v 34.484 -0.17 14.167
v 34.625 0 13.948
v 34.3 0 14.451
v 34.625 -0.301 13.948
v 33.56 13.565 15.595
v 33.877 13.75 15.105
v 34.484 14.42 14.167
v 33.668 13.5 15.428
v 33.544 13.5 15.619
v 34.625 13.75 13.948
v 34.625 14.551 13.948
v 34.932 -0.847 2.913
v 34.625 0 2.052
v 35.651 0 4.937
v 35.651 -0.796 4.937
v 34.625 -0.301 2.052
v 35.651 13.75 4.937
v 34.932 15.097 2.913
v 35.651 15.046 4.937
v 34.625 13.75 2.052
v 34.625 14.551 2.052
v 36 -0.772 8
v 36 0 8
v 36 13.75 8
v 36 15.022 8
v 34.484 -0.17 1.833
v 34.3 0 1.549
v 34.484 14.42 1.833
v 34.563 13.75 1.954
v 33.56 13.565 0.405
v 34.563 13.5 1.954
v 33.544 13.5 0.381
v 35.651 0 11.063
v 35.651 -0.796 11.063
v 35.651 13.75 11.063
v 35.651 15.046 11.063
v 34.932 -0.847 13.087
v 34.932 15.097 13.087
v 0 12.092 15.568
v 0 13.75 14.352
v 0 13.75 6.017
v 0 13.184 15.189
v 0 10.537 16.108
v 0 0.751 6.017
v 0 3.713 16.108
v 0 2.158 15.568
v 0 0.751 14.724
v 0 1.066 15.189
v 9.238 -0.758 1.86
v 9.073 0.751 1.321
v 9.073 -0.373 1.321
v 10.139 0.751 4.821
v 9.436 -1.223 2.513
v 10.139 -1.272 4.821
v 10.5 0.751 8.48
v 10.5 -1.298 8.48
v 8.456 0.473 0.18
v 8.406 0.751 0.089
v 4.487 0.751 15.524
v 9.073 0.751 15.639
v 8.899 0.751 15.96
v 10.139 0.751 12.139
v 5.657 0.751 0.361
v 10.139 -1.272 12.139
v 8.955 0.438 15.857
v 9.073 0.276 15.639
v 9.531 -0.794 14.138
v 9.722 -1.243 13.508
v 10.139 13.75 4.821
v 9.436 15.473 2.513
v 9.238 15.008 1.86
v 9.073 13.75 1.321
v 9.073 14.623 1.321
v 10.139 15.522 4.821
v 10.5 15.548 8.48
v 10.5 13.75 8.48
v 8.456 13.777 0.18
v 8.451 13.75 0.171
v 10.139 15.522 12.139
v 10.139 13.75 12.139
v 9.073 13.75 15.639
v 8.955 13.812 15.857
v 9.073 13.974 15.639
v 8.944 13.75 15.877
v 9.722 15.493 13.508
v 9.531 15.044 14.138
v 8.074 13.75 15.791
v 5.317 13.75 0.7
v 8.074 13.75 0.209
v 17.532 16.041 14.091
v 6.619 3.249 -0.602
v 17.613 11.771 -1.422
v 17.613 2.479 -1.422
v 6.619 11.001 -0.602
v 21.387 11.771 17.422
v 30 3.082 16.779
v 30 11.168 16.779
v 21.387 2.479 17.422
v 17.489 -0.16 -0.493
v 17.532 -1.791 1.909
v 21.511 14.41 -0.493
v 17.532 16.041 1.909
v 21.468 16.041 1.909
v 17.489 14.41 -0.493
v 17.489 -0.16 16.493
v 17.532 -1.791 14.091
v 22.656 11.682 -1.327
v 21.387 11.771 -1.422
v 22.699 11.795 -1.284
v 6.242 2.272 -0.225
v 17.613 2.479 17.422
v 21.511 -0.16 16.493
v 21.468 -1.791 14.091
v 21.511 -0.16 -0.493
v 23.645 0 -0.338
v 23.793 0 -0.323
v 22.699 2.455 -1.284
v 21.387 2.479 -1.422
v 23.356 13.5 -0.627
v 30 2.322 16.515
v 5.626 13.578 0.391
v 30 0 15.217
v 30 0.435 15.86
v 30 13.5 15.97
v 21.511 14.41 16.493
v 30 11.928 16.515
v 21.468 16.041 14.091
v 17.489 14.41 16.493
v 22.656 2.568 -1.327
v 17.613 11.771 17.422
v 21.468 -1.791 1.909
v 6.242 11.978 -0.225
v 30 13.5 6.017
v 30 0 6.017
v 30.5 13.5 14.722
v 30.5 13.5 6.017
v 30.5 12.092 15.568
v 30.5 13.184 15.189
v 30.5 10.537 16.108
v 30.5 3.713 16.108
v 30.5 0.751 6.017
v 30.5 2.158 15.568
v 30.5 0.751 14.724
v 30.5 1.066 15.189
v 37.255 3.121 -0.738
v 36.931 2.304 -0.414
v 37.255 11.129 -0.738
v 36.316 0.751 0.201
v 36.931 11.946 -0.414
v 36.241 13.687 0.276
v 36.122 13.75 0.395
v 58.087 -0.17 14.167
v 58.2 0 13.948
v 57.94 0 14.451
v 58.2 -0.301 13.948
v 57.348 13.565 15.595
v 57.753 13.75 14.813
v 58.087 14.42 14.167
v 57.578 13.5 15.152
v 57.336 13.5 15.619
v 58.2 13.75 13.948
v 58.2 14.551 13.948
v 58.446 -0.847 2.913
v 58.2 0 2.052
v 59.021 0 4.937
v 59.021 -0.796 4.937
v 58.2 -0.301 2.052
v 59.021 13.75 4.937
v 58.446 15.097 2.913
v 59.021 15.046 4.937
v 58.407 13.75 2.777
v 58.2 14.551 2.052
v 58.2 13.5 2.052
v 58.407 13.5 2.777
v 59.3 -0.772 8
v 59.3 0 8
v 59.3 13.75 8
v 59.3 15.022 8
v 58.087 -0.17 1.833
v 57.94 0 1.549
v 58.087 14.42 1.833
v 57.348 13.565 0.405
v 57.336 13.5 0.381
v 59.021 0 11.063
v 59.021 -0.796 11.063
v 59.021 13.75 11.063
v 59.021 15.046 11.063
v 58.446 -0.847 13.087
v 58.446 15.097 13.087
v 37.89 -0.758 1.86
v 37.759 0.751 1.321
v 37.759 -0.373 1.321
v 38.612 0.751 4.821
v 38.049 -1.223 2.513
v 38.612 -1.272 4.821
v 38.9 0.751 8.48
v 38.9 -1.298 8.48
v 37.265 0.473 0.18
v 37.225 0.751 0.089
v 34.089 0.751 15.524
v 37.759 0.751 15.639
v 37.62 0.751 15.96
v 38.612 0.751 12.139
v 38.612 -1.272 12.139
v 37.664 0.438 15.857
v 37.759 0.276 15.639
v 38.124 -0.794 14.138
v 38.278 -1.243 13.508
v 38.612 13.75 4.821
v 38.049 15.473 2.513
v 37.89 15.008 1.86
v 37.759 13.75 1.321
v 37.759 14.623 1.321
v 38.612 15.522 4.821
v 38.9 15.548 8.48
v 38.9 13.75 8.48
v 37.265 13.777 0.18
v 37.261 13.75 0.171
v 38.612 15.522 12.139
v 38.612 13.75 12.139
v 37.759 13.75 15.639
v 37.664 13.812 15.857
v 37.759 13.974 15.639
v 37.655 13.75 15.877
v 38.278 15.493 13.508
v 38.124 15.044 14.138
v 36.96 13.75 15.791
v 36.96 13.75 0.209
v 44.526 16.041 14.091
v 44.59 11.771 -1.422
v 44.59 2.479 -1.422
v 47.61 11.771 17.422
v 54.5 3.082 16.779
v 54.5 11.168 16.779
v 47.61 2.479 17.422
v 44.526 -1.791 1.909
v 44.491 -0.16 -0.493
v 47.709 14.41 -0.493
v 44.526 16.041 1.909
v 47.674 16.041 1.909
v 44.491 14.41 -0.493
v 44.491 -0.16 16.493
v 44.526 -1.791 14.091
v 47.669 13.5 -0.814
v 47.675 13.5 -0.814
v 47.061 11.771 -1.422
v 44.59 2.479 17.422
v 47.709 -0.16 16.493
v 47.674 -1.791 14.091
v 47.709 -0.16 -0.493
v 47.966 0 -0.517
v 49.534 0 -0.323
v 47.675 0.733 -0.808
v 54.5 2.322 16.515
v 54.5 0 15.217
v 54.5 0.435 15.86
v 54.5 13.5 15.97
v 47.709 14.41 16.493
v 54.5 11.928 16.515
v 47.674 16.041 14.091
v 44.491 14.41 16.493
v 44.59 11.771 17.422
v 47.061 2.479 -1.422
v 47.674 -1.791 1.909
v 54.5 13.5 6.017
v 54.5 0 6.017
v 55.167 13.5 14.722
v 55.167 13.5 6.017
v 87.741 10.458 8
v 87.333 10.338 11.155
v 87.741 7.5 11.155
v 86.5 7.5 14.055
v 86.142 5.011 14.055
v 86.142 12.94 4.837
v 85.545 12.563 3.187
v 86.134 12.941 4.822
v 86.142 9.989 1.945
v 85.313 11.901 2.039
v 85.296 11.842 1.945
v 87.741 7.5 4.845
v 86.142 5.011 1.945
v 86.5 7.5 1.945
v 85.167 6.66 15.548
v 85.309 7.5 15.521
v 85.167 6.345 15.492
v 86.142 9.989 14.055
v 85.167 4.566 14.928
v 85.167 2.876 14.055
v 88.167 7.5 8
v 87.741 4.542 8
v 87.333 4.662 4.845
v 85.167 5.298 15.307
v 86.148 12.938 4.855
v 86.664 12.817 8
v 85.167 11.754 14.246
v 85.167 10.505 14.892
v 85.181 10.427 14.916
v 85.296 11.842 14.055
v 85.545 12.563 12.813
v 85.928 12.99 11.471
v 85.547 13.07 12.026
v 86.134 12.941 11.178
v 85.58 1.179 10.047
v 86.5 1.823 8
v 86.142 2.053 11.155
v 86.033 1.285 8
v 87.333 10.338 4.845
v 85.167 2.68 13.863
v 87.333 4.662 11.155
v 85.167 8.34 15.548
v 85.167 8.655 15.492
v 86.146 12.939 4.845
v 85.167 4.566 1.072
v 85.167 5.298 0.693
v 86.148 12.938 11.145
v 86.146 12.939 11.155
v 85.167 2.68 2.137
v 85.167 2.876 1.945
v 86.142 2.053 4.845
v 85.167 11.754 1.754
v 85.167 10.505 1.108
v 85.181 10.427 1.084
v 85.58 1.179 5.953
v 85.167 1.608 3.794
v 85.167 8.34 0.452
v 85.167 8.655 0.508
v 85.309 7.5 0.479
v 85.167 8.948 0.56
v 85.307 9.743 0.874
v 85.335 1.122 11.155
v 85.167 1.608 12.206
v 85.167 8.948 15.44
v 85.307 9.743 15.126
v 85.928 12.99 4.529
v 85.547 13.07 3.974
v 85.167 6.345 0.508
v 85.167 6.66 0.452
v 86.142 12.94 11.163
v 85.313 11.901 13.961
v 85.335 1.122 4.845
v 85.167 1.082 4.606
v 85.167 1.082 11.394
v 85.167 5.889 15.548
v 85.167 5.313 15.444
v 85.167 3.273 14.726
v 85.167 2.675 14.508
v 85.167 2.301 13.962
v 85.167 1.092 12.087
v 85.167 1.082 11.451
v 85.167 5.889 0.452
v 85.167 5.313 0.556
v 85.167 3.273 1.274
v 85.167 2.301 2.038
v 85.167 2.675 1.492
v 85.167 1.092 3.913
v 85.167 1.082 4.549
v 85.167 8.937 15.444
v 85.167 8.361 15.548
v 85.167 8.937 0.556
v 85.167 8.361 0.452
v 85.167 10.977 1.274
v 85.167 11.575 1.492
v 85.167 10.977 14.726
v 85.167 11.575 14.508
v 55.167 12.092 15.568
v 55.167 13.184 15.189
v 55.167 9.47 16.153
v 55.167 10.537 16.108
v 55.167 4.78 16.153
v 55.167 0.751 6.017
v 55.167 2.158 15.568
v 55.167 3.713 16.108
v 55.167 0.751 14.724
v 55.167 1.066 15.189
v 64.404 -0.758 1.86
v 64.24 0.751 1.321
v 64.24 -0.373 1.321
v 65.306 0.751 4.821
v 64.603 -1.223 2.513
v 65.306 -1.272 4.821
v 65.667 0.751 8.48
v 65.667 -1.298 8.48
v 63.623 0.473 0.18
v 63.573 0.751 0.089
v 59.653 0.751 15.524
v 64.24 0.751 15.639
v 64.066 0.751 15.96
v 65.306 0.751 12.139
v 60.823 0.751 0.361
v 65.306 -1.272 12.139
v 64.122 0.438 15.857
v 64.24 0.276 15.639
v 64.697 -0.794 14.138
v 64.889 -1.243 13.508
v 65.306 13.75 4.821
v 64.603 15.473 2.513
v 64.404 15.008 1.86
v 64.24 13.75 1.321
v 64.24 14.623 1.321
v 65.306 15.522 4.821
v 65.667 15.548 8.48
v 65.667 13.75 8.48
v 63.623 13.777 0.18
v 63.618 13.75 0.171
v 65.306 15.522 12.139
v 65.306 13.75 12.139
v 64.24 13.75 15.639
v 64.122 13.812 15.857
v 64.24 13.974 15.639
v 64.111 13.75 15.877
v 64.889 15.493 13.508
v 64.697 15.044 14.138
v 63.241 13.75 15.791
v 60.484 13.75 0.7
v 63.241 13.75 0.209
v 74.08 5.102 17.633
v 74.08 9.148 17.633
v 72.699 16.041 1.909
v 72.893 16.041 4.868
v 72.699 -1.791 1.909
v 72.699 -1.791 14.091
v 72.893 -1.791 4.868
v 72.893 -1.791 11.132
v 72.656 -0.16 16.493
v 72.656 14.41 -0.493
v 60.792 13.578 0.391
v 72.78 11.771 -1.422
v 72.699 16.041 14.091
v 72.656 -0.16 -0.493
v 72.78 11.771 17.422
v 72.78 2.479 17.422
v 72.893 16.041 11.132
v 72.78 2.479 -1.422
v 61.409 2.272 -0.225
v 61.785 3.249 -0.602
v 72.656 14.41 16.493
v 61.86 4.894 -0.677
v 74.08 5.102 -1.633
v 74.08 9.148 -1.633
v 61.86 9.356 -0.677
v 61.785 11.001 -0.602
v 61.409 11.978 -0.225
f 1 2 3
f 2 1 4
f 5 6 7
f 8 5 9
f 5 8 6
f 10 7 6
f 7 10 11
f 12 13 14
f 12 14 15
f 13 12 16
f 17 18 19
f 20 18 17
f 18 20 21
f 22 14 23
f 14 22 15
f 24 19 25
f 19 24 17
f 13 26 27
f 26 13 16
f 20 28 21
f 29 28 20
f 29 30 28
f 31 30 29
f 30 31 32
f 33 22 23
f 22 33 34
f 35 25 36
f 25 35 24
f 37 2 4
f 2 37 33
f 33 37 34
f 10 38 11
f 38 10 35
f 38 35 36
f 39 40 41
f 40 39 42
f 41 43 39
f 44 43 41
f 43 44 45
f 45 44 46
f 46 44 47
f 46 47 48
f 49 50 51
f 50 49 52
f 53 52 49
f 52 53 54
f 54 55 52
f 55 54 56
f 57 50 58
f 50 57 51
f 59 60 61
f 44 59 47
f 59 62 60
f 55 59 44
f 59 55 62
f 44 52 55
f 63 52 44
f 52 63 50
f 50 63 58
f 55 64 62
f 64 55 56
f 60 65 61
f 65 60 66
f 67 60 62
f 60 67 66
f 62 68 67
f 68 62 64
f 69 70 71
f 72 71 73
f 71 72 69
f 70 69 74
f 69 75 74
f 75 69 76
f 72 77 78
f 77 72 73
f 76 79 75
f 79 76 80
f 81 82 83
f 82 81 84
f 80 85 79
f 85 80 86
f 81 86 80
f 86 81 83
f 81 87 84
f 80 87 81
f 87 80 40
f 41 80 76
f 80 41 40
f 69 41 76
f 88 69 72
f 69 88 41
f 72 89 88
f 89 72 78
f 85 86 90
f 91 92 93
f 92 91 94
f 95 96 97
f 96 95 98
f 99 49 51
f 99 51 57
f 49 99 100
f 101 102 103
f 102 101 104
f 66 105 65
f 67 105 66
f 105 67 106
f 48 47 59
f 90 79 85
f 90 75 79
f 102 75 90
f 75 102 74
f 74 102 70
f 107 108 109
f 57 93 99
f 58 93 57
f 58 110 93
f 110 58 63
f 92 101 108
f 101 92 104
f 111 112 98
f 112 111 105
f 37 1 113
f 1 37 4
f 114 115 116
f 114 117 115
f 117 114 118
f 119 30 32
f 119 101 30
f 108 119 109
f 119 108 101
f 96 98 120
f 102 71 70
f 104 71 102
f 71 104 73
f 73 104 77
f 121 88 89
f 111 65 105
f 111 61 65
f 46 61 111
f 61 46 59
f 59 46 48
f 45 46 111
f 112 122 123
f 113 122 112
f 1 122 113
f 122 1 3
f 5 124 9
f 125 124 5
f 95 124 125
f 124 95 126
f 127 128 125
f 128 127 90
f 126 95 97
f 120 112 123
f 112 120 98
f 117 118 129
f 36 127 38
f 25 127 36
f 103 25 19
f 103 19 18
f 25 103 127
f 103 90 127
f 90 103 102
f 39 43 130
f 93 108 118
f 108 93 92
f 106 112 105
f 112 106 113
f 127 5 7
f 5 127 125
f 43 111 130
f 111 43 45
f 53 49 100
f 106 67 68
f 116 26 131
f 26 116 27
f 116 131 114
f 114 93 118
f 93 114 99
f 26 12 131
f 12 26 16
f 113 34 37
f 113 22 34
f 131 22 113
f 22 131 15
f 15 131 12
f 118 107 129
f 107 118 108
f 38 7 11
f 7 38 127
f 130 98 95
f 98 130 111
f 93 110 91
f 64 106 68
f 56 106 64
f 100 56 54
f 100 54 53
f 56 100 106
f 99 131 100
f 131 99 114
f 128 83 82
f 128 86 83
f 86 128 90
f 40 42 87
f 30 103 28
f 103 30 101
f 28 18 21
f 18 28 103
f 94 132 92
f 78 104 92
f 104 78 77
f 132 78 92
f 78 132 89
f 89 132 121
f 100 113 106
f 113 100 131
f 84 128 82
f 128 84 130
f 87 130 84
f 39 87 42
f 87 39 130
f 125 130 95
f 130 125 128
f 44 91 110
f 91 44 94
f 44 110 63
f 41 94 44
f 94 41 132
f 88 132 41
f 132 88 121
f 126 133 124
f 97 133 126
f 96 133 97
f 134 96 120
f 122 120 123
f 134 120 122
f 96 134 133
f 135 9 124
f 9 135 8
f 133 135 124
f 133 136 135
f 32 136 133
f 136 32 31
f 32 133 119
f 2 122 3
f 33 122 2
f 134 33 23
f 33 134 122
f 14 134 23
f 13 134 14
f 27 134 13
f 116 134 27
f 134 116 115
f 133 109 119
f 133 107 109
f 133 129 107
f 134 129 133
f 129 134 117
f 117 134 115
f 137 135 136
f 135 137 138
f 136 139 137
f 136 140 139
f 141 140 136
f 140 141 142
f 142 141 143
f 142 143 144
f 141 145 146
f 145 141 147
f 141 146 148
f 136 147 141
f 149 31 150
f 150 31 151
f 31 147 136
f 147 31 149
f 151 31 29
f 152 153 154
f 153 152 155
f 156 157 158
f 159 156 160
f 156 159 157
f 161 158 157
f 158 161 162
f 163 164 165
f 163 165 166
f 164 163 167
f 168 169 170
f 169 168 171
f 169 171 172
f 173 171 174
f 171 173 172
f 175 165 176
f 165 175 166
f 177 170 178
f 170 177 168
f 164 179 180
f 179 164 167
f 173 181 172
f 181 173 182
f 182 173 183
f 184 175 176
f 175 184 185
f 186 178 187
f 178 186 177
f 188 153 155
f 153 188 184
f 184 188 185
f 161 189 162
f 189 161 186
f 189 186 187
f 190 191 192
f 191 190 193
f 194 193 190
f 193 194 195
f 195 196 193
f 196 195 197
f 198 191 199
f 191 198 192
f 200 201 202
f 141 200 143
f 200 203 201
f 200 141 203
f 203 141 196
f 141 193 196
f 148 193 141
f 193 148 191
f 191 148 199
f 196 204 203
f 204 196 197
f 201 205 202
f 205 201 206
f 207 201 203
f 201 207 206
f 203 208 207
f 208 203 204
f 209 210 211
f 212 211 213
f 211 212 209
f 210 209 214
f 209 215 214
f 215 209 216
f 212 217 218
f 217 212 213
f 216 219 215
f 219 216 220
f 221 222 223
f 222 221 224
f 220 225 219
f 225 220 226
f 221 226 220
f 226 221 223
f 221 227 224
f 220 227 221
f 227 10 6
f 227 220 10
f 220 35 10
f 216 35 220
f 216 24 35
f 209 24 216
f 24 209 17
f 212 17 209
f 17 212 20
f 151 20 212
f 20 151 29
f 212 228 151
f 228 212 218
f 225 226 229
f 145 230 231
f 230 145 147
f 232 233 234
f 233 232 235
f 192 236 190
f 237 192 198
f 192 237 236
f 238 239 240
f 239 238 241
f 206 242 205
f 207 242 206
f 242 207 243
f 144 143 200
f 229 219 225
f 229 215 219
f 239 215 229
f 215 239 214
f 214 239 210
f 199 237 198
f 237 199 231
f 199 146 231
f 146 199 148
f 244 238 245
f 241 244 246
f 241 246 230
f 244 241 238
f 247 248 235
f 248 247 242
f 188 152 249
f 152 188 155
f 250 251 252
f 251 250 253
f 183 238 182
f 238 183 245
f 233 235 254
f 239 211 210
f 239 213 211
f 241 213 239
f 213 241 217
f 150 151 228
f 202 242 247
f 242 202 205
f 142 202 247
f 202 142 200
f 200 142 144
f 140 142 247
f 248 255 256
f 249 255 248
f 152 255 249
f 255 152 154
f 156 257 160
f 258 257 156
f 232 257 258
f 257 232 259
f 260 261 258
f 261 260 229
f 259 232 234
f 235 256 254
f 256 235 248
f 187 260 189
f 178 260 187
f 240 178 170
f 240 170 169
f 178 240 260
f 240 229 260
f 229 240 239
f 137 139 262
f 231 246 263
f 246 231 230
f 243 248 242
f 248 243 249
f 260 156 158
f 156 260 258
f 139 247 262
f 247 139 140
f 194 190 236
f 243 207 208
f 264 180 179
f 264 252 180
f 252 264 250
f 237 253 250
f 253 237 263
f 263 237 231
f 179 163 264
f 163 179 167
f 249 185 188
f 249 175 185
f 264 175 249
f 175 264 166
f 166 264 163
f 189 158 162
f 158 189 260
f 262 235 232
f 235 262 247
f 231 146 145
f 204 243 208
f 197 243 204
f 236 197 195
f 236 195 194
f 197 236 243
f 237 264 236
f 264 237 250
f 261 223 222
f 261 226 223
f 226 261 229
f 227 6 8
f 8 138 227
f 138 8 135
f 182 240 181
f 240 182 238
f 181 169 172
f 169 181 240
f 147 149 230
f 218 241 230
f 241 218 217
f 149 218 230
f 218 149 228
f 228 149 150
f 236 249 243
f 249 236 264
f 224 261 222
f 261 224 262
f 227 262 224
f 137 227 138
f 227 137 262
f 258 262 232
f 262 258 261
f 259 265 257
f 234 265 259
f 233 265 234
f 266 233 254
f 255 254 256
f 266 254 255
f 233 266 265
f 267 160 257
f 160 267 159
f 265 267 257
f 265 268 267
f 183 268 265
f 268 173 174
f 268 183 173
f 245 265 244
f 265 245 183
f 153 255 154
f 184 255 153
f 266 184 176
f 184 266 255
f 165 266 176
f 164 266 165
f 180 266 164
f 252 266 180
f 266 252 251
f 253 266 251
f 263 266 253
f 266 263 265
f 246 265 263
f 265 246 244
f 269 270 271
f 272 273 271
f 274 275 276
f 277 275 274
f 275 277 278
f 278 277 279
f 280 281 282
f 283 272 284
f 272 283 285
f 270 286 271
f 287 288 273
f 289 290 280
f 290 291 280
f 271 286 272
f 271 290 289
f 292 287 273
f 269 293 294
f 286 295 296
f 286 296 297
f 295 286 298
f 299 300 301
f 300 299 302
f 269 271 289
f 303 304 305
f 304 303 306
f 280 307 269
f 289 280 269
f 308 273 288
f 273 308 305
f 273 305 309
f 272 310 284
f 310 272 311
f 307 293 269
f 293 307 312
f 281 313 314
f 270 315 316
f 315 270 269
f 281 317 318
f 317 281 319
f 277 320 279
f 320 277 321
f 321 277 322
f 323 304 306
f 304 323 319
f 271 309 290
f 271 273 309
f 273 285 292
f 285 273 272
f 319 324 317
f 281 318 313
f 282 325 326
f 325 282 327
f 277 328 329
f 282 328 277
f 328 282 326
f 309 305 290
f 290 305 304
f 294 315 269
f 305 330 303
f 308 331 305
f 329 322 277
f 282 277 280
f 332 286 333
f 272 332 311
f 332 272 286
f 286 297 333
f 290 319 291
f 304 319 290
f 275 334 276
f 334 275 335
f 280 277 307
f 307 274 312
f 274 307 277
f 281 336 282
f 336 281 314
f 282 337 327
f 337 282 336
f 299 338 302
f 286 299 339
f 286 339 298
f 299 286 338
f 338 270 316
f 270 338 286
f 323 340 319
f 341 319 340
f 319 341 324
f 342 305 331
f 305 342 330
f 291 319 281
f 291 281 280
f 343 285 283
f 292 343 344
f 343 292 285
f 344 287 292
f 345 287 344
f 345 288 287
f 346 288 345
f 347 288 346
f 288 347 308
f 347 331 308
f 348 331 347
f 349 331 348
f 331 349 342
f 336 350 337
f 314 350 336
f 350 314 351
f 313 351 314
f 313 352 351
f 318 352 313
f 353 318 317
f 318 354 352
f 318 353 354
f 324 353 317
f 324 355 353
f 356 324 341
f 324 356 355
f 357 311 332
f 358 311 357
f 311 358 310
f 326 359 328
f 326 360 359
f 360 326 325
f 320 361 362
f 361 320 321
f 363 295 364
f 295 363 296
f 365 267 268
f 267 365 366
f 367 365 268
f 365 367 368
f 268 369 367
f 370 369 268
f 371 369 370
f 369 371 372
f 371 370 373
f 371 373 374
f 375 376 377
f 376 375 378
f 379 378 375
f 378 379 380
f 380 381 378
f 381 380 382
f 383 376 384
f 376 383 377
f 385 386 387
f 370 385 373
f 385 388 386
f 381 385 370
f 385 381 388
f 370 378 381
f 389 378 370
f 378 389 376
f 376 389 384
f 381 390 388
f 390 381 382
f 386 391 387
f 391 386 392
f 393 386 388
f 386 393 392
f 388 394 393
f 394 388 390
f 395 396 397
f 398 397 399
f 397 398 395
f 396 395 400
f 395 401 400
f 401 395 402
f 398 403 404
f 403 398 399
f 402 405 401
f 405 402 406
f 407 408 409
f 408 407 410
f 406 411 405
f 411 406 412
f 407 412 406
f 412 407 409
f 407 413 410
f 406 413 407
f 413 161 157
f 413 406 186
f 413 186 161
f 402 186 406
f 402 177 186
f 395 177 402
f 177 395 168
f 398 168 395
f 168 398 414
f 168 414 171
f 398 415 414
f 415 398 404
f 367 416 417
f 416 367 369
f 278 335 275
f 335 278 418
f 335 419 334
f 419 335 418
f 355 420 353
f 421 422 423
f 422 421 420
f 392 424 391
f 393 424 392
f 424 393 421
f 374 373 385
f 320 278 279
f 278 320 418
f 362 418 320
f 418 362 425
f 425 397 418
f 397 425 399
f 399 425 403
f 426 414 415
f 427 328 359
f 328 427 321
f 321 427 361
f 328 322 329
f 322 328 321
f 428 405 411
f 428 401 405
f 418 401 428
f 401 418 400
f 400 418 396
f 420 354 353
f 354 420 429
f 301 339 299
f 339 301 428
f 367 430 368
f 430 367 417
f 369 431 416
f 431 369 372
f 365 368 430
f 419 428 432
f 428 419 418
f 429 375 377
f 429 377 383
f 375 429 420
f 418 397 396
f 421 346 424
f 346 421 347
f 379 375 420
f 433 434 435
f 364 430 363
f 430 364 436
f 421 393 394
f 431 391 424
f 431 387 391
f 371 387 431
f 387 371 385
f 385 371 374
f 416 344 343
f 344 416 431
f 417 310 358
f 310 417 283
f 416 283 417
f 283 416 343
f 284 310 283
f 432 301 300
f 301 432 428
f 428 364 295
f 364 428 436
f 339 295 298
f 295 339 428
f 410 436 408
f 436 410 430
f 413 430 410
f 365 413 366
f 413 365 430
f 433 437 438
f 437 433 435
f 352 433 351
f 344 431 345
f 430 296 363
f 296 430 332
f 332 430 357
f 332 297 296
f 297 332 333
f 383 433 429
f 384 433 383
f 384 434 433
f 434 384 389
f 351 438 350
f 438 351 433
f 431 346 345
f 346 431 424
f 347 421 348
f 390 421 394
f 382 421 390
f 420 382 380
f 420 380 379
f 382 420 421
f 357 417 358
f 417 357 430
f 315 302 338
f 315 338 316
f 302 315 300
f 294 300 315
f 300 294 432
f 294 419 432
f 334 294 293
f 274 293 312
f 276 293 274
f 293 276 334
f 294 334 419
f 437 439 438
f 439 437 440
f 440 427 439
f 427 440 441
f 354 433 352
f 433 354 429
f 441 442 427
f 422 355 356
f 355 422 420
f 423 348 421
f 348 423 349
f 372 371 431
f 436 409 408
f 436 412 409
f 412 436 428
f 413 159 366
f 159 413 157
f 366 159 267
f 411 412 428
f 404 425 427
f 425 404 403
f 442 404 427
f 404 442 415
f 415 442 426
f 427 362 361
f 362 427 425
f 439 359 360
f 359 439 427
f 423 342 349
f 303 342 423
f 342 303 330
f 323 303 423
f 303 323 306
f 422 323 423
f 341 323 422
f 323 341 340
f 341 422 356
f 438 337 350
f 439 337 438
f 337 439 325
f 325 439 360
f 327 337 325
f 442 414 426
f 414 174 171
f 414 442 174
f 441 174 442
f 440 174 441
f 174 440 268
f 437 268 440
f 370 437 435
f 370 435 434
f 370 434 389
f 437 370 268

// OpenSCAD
// file: part/util/finger-tip.scad
module fingertip(length,x,y,z,padding,width)
{ 
	difference() {
		scale([y,x,z]) {
			intersection() {
                difference() {
                    union() {
                        translate([length-5,5,5]) sphere(r =7);
                        translate([0,-5,-5]) cube([length,width + 10,20]);
                    }
                    //cutout for the side
                        translate([-4,-width+0.001,5.3]) rotate([-90,0,0]) cylinder(r=11,h=10);
                        translate([-4,width - padding*(1/x),5.3]) rotate([-90,0,0]) cylinder(r=11,h=10);
                }
                hull() {
                    for(i=[-1,1], j=[-1,1]) {
                        //angled cylinders to provide the outer shape of the finger
                        translate([length/10,i*2.4 + width/2,j*2.2 + 5]) rotate([i*j*-4,j*86,0]) cylinder(d=6,h=20,center=true);
                        //tip part
                        translate([length-3, i + width/2, j*2.2 + 5])rotate([i*j*-4,j*-80,0]) cylinder(d=6,h=10,center=true);  
                    }
                }              
            } 
		}
        translate([0,padding/2 * x,0])              
        fingerbasecutout(width-padding,x,z);
	}
}

module fingerbasecutout(width,x,z) {
	translate([-13/z,0,0]) rotate([0,45,0]) translate([-50,0,0]) cube([100,width*x, 10]);
}

rotate([0,-90,0]) fingertip(20,1.5,1.5,1.6,0.5,9.5);
// file: part/util/finger-base.scad
module fingerbase(length,x,y,z,padding,width)
{ 
	difference() {
		scale([y,x,z]) {
			intersection() {
                difference() {
                    union() {
                        translate([length-4,-5,5]) rotate([-90,0,0]) cylinder(r=8,h=width + 10);
                        translate([0,-5,-5]) cube([length,width + 10,20]);
                    }
                    //cutout for the side
                        translate([-4,-width+0.001,5.3]) rotate([-90,0,0]) cylinder(r=11,h=10);
                        translate([-4,width - padding*(1/x),5.3]) rotate([-90,0,0]) cylinder(r=11,h=10);
                }
                
                hull() {
                    for(i=[-1,1], j=[-1,1]) {
                        //angled cylinders to provide the outer shape of the finger
                        translate([length/10,i*2.4 + width/2,j*2.2 + 5]) rotate([i*j*-4,j*86,0]) cylinder(d=6,h=20,center=true);
                        translate([length+4, i*2.4 + width/2, j*2.2 + 5]) rotate([i*j*-4,j*-86,0]) cylinder(d=6,h=20,center=true);
                    }
                }
            } 
		}
        translate([0,padding/2 * x,0])              
        fingerbasecutout(width-padding,x,z);
        translate([length * y,0,0]) 
        mirror([1,0,0])fingerbasecutout(width-padding,x,z);
	}
}

module fingerbasecutout(width,x,z) {
	//cubic parts
	translate([-100,0,0]) cube([100,width*x,100]);
	translate([-13/z,0,0]) rotate([0,45,0]) translate([-50,0,0]) cube([100,width*x, 10]);
}

//fingerbase(20,1.5,1.5,1.6,0.5,9.5);
fingerbase(20,1.5,1.5,1.6,0.5,9.5);
// file: part/finger-middle.scad
use <util/finger-base.scad>;
use <util/finger-tip.scad>;

module middlefinger(length,x,y,z,angle){
    difference(){
        union(){
            //base object
            fingerbase(length,x,y-0.3,z,0.5,9.5);
            
            //rotate object
            //starting point t=0
            translate([length*1.4,0,length*0.4])
            //rotate
            rotate([0,angle*$t,0])
            //rotate point in the object
            translate([-length/6,0,-length/2.5])
            fingertip(length,x,y,z,0.5,9.5);
        }
    }
}

middlefinger(20,1.5,1.5,1.6,50);
// main file
use <part/finger-middle.scad>;
use <part/util/finger-base.scad>;

module finger(length,x,y,z,angle1,angle2){
    //base object
    fingerbase(length,x,y,z,0.5,9.5);
    //rotate object
    //starting point t=0
    translate([length*1.65,0,length*0.4])
    //rotate
    rotate([0,angle1*$t,0])
    //rotate point in the object
    translate([-length/8,0,-length/2.5])
    middlefinger(length,x,y,z,angle2);
}

finger(20,1.5,1.5,1.6,90,90);
